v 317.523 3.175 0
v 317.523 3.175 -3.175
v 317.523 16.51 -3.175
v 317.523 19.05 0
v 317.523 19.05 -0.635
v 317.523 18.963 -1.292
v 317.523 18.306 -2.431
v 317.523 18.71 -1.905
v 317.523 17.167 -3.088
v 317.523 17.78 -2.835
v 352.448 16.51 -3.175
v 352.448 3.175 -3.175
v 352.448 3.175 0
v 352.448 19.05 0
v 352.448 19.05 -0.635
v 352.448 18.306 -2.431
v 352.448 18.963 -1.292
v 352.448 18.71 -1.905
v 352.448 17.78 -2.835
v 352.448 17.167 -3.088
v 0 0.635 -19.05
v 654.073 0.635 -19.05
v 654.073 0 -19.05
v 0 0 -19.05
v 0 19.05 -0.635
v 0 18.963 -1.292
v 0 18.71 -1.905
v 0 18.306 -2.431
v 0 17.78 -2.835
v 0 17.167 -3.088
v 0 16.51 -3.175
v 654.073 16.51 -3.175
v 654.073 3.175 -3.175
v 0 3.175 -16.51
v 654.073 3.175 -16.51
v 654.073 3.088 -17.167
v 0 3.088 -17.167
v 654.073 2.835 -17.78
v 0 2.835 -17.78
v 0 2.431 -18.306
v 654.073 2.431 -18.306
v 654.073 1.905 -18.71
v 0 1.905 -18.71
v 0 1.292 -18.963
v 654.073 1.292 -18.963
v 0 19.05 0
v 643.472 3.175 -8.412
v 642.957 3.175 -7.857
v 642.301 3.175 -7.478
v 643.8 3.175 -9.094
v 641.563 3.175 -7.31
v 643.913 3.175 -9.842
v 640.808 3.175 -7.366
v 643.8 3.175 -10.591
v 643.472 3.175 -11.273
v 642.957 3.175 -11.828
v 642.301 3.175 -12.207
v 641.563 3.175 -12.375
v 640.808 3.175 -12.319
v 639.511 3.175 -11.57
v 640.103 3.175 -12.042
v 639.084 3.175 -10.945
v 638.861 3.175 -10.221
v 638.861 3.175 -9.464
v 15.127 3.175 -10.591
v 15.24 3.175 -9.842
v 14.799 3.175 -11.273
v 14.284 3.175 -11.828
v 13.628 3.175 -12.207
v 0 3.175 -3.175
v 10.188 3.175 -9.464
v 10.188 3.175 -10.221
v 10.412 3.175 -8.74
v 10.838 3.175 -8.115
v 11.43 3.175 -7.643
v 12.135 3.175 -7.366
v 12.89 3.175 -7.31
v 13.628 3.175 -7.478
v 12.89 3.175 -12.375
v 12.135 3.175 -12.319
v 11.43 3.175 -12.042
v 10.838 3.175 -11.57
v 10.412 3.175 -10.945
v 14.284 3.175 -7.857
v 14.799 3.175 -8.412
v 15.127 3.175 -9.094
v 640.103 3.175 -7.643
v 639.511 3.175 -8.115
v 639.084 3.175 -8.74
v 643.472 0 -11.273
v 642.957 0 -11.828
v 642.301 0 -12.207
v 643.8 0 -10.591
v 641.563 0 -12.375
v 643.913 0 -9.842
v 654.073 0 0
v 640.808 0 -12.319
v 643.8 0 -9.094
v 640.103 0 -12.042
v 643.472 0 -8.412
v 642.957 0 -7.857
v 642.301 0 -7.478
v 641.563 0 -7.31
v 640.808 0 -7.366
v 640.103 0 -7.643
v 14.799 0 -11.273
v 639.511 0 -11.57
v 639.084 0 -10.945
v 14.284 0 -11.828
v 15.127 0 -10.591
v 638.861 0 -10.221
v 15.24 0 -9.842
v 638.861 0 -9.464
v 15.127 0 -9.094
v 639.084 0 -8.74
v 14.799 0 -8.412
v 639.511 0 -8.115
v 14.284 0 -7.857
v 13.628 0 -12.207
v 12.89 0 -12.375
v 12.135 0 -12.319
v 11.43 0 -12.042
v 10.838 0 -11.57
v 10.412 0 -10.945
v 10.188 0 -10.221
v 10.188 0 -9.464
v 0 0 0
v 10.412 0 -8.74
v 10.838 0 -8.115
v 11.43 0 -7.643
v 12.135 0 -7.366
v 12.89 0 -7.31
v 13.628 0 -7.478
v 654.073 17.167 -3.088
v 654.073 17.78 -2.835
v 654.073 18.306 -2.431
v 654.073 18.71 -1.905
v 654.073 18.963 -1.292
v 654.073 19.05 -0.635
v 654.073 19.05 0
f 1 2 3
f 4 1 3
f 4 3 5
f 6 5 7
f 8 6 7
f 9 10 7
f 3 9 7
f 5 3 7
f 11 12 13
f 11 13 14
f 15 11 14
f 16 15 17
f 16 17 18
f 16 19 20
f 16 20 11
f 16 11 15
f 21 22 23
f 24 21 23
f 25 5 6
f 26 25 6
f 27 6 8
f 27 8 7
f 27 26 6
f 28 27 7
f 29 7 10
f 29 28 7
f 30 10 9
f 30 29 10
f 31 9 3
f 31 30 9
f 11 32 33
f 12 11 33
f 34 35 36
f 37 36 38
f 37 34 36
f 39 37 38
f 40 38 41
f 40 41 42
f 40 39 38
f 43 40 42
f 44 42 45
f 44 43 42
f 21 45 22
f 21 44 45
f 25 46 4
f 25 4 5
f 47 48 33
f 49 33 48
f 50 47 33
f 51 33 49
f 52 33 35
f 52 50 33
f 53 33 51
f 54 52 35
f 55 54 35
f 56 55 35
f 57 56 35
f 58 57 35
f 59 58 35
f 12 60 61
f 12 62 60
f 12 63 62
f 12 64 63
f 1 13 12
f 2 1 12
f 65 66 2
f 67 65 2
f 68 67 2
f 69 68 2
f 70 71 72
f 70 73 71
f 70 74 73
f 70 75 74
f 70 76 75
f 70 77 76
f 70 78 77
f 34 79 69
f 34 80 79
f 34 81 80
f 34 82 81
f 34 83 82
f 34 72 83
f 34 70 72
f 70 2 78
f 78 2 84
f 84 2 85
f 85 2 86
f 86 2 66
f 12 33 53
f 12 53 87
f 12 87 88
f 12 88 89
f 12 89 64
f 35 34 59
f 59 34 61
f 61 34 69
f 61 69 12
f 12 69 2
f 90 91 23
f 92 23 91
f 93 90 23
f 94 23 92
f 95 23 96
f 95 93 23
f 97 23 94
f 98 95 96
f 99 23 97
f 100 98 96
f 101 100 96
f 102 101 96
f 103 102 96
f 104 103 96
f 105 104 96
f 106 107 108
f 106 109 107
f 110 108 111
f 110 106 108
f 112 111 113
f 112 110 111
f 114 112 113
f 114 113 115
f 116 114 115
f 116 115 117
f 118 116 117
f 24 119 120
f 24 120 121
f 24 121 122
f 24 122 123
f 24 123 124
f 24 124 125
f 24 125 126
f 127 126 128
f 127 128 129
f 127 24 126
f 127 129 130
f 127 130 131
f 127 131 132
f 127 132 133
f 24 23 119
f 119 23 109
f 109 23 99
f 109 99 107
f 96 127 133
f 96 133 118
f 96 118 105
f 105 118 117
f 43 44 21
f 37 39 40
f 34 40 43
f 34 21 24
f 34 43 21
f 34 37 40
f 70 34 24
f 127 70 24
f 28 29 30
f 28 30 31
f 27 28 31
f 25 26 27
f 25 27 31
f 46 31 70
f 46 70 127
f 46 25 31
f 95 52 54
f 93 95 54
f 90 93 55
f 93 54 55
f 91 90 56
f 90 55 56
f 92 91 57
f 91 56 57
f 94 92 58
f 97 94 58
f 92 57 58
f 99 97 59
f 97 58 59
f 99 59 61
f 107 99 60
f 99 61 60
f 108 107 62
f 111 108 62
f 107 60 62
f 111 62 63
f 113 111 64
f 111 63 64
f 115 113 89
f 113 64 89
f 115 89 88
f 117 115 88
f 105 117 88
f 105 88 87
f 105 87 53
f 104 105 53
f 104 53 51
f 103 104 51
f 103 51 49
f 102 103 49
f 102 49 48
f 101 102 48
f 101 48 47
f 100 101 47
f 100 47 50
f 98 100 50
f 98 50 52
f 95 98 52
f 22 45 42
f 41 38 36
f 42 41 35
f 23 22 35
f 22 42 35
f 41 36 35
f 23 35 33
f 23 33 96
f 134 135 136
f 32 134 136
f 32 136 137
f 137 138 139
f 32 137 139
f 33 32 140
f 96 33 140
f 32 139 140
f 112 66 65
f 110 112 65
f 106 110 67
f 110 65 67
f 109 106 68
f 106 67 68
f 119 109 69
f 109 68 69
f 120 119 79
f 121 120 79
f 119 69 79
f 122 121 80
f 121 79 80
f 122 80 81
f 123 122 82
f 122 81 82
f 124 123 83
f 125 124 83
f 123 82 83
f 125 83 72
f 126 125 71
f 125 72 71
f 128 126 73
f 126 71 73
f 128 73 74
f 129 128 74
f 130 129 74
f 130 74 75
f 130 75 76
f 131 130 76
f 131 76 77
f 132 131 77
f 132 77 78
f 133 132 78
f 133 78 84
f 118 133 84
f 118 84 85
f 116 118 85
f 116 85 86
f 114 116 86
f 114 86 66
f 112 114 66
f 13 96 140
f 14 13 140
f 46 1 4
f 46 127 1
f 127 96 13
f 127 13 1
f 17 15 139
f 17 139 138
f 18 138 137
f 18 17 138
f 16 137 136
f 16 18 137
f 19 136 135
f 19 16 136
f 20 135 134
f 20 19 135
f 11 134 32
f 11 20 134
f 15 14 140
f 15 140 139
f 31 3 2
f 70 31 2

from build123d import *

# Parameters (mm, degrees)
BOSS_EXTRUDE1_DEPTH = 654.07286
CUT_EXTRUDE1_REACH  = 5.175
SKETCH2_R           = 2.54
SKETCH3_W           = 34.925
SKETCH3_H           = 49.342597017
CUT_EXTRUDE2_DEPTH  = 4.175


with BuildPart() as part:
    # Sketch1 → Boss-Extrude1 (new body)
    with BuildSketch(Plane(origin=(0, 0, 0), x_dir=(0, 0, -1), z_dir=(1, 0, 0))):
        with BuildLine():
            Line((3.175, 3.175), (16.51, 3.175))
            ThreePointArc((16.51, 3.175), (18.306051224, 2.431051224), (19.05, 0.635))
            Line((19.05, 0.635), (19.05, 0))
            Line((19.05, 0), (0, 0))
            Line((0, 0), (0, 19.05))
            Line((0, 19.05), (0.635, 19.05))
            ThreePointArc((0.635, 19.05), (2.431051224, 18.306051224), (3.175, 16.51))
            Line((3.175, 16.51), (3.175, 3.175))
        make_face()
    extrude(amount=BOSS_EXTRUDE1_DEPTH)

    # Sketch2 → Cut-Extrude1 (cut, up to next)
    with BuildSketch(Plane(origin=(0, 3.175, 0), x_dir=(1, 0, 0), z_dir=(0, 1, 0)), mode=Mode.PRIVATE) as cut_extrude1_sk1:
        with Locations((641.37286, 9.8425)):
            Circle(SKETCH2_R)
    cut_extrude1_tool1 = extrude(cut_extrude1_sk1.sketch, amount=-CUT_EXTRUDE1_REACH, mode=Mode.PRIVATE) & part.part
    add(cut_extrude1_tool1.solids().sort_by_distance((641.37286, 3.175, -9.8425))[0], mode=Mode.SUBTRACT)
    # Sketch2 → Cut-Extrude1 (cut, up to next)
    with BuildSketch(Plane(origin=(0, 3.175, 0), x_dir=(1, 0, 0), z_dir=(0, 1, 0)), mode=Mode.PRIVATE) as cut_extrude1_sk2:
        with Locations((12.7, 9.8425)):
            Circle(SKETCH2_R)
    cut_extrude1_tool2 = extrude(cut_extrude1_sk2.sketch, amount=-CUT_EXTRUDE1_REACH, mode=Mode.PRIVATE) & part.part
    add(cut_extrude1_tool2.solids().sort_by_distance((12.7, 3.175, -9.8425))[0], mode=Mode.SUBTRACT)

    # Sketch3 → Cut-Extrude2 (cut, through all)
    with BuildSketch(Plane(origin=(0, 0, -3.175), x_dir=(-1, 0, 0), z_dir=(0, 0, -1))):
        with Locations((-334.98536, 27.846298508)):
            Rectangle(SKETCH3_W, SKETCH3_H)
    extrude(amount=-CUT_EXTRUDE2_DEPTH, mode=Mode.SUBTRACT)


solid = part.part
